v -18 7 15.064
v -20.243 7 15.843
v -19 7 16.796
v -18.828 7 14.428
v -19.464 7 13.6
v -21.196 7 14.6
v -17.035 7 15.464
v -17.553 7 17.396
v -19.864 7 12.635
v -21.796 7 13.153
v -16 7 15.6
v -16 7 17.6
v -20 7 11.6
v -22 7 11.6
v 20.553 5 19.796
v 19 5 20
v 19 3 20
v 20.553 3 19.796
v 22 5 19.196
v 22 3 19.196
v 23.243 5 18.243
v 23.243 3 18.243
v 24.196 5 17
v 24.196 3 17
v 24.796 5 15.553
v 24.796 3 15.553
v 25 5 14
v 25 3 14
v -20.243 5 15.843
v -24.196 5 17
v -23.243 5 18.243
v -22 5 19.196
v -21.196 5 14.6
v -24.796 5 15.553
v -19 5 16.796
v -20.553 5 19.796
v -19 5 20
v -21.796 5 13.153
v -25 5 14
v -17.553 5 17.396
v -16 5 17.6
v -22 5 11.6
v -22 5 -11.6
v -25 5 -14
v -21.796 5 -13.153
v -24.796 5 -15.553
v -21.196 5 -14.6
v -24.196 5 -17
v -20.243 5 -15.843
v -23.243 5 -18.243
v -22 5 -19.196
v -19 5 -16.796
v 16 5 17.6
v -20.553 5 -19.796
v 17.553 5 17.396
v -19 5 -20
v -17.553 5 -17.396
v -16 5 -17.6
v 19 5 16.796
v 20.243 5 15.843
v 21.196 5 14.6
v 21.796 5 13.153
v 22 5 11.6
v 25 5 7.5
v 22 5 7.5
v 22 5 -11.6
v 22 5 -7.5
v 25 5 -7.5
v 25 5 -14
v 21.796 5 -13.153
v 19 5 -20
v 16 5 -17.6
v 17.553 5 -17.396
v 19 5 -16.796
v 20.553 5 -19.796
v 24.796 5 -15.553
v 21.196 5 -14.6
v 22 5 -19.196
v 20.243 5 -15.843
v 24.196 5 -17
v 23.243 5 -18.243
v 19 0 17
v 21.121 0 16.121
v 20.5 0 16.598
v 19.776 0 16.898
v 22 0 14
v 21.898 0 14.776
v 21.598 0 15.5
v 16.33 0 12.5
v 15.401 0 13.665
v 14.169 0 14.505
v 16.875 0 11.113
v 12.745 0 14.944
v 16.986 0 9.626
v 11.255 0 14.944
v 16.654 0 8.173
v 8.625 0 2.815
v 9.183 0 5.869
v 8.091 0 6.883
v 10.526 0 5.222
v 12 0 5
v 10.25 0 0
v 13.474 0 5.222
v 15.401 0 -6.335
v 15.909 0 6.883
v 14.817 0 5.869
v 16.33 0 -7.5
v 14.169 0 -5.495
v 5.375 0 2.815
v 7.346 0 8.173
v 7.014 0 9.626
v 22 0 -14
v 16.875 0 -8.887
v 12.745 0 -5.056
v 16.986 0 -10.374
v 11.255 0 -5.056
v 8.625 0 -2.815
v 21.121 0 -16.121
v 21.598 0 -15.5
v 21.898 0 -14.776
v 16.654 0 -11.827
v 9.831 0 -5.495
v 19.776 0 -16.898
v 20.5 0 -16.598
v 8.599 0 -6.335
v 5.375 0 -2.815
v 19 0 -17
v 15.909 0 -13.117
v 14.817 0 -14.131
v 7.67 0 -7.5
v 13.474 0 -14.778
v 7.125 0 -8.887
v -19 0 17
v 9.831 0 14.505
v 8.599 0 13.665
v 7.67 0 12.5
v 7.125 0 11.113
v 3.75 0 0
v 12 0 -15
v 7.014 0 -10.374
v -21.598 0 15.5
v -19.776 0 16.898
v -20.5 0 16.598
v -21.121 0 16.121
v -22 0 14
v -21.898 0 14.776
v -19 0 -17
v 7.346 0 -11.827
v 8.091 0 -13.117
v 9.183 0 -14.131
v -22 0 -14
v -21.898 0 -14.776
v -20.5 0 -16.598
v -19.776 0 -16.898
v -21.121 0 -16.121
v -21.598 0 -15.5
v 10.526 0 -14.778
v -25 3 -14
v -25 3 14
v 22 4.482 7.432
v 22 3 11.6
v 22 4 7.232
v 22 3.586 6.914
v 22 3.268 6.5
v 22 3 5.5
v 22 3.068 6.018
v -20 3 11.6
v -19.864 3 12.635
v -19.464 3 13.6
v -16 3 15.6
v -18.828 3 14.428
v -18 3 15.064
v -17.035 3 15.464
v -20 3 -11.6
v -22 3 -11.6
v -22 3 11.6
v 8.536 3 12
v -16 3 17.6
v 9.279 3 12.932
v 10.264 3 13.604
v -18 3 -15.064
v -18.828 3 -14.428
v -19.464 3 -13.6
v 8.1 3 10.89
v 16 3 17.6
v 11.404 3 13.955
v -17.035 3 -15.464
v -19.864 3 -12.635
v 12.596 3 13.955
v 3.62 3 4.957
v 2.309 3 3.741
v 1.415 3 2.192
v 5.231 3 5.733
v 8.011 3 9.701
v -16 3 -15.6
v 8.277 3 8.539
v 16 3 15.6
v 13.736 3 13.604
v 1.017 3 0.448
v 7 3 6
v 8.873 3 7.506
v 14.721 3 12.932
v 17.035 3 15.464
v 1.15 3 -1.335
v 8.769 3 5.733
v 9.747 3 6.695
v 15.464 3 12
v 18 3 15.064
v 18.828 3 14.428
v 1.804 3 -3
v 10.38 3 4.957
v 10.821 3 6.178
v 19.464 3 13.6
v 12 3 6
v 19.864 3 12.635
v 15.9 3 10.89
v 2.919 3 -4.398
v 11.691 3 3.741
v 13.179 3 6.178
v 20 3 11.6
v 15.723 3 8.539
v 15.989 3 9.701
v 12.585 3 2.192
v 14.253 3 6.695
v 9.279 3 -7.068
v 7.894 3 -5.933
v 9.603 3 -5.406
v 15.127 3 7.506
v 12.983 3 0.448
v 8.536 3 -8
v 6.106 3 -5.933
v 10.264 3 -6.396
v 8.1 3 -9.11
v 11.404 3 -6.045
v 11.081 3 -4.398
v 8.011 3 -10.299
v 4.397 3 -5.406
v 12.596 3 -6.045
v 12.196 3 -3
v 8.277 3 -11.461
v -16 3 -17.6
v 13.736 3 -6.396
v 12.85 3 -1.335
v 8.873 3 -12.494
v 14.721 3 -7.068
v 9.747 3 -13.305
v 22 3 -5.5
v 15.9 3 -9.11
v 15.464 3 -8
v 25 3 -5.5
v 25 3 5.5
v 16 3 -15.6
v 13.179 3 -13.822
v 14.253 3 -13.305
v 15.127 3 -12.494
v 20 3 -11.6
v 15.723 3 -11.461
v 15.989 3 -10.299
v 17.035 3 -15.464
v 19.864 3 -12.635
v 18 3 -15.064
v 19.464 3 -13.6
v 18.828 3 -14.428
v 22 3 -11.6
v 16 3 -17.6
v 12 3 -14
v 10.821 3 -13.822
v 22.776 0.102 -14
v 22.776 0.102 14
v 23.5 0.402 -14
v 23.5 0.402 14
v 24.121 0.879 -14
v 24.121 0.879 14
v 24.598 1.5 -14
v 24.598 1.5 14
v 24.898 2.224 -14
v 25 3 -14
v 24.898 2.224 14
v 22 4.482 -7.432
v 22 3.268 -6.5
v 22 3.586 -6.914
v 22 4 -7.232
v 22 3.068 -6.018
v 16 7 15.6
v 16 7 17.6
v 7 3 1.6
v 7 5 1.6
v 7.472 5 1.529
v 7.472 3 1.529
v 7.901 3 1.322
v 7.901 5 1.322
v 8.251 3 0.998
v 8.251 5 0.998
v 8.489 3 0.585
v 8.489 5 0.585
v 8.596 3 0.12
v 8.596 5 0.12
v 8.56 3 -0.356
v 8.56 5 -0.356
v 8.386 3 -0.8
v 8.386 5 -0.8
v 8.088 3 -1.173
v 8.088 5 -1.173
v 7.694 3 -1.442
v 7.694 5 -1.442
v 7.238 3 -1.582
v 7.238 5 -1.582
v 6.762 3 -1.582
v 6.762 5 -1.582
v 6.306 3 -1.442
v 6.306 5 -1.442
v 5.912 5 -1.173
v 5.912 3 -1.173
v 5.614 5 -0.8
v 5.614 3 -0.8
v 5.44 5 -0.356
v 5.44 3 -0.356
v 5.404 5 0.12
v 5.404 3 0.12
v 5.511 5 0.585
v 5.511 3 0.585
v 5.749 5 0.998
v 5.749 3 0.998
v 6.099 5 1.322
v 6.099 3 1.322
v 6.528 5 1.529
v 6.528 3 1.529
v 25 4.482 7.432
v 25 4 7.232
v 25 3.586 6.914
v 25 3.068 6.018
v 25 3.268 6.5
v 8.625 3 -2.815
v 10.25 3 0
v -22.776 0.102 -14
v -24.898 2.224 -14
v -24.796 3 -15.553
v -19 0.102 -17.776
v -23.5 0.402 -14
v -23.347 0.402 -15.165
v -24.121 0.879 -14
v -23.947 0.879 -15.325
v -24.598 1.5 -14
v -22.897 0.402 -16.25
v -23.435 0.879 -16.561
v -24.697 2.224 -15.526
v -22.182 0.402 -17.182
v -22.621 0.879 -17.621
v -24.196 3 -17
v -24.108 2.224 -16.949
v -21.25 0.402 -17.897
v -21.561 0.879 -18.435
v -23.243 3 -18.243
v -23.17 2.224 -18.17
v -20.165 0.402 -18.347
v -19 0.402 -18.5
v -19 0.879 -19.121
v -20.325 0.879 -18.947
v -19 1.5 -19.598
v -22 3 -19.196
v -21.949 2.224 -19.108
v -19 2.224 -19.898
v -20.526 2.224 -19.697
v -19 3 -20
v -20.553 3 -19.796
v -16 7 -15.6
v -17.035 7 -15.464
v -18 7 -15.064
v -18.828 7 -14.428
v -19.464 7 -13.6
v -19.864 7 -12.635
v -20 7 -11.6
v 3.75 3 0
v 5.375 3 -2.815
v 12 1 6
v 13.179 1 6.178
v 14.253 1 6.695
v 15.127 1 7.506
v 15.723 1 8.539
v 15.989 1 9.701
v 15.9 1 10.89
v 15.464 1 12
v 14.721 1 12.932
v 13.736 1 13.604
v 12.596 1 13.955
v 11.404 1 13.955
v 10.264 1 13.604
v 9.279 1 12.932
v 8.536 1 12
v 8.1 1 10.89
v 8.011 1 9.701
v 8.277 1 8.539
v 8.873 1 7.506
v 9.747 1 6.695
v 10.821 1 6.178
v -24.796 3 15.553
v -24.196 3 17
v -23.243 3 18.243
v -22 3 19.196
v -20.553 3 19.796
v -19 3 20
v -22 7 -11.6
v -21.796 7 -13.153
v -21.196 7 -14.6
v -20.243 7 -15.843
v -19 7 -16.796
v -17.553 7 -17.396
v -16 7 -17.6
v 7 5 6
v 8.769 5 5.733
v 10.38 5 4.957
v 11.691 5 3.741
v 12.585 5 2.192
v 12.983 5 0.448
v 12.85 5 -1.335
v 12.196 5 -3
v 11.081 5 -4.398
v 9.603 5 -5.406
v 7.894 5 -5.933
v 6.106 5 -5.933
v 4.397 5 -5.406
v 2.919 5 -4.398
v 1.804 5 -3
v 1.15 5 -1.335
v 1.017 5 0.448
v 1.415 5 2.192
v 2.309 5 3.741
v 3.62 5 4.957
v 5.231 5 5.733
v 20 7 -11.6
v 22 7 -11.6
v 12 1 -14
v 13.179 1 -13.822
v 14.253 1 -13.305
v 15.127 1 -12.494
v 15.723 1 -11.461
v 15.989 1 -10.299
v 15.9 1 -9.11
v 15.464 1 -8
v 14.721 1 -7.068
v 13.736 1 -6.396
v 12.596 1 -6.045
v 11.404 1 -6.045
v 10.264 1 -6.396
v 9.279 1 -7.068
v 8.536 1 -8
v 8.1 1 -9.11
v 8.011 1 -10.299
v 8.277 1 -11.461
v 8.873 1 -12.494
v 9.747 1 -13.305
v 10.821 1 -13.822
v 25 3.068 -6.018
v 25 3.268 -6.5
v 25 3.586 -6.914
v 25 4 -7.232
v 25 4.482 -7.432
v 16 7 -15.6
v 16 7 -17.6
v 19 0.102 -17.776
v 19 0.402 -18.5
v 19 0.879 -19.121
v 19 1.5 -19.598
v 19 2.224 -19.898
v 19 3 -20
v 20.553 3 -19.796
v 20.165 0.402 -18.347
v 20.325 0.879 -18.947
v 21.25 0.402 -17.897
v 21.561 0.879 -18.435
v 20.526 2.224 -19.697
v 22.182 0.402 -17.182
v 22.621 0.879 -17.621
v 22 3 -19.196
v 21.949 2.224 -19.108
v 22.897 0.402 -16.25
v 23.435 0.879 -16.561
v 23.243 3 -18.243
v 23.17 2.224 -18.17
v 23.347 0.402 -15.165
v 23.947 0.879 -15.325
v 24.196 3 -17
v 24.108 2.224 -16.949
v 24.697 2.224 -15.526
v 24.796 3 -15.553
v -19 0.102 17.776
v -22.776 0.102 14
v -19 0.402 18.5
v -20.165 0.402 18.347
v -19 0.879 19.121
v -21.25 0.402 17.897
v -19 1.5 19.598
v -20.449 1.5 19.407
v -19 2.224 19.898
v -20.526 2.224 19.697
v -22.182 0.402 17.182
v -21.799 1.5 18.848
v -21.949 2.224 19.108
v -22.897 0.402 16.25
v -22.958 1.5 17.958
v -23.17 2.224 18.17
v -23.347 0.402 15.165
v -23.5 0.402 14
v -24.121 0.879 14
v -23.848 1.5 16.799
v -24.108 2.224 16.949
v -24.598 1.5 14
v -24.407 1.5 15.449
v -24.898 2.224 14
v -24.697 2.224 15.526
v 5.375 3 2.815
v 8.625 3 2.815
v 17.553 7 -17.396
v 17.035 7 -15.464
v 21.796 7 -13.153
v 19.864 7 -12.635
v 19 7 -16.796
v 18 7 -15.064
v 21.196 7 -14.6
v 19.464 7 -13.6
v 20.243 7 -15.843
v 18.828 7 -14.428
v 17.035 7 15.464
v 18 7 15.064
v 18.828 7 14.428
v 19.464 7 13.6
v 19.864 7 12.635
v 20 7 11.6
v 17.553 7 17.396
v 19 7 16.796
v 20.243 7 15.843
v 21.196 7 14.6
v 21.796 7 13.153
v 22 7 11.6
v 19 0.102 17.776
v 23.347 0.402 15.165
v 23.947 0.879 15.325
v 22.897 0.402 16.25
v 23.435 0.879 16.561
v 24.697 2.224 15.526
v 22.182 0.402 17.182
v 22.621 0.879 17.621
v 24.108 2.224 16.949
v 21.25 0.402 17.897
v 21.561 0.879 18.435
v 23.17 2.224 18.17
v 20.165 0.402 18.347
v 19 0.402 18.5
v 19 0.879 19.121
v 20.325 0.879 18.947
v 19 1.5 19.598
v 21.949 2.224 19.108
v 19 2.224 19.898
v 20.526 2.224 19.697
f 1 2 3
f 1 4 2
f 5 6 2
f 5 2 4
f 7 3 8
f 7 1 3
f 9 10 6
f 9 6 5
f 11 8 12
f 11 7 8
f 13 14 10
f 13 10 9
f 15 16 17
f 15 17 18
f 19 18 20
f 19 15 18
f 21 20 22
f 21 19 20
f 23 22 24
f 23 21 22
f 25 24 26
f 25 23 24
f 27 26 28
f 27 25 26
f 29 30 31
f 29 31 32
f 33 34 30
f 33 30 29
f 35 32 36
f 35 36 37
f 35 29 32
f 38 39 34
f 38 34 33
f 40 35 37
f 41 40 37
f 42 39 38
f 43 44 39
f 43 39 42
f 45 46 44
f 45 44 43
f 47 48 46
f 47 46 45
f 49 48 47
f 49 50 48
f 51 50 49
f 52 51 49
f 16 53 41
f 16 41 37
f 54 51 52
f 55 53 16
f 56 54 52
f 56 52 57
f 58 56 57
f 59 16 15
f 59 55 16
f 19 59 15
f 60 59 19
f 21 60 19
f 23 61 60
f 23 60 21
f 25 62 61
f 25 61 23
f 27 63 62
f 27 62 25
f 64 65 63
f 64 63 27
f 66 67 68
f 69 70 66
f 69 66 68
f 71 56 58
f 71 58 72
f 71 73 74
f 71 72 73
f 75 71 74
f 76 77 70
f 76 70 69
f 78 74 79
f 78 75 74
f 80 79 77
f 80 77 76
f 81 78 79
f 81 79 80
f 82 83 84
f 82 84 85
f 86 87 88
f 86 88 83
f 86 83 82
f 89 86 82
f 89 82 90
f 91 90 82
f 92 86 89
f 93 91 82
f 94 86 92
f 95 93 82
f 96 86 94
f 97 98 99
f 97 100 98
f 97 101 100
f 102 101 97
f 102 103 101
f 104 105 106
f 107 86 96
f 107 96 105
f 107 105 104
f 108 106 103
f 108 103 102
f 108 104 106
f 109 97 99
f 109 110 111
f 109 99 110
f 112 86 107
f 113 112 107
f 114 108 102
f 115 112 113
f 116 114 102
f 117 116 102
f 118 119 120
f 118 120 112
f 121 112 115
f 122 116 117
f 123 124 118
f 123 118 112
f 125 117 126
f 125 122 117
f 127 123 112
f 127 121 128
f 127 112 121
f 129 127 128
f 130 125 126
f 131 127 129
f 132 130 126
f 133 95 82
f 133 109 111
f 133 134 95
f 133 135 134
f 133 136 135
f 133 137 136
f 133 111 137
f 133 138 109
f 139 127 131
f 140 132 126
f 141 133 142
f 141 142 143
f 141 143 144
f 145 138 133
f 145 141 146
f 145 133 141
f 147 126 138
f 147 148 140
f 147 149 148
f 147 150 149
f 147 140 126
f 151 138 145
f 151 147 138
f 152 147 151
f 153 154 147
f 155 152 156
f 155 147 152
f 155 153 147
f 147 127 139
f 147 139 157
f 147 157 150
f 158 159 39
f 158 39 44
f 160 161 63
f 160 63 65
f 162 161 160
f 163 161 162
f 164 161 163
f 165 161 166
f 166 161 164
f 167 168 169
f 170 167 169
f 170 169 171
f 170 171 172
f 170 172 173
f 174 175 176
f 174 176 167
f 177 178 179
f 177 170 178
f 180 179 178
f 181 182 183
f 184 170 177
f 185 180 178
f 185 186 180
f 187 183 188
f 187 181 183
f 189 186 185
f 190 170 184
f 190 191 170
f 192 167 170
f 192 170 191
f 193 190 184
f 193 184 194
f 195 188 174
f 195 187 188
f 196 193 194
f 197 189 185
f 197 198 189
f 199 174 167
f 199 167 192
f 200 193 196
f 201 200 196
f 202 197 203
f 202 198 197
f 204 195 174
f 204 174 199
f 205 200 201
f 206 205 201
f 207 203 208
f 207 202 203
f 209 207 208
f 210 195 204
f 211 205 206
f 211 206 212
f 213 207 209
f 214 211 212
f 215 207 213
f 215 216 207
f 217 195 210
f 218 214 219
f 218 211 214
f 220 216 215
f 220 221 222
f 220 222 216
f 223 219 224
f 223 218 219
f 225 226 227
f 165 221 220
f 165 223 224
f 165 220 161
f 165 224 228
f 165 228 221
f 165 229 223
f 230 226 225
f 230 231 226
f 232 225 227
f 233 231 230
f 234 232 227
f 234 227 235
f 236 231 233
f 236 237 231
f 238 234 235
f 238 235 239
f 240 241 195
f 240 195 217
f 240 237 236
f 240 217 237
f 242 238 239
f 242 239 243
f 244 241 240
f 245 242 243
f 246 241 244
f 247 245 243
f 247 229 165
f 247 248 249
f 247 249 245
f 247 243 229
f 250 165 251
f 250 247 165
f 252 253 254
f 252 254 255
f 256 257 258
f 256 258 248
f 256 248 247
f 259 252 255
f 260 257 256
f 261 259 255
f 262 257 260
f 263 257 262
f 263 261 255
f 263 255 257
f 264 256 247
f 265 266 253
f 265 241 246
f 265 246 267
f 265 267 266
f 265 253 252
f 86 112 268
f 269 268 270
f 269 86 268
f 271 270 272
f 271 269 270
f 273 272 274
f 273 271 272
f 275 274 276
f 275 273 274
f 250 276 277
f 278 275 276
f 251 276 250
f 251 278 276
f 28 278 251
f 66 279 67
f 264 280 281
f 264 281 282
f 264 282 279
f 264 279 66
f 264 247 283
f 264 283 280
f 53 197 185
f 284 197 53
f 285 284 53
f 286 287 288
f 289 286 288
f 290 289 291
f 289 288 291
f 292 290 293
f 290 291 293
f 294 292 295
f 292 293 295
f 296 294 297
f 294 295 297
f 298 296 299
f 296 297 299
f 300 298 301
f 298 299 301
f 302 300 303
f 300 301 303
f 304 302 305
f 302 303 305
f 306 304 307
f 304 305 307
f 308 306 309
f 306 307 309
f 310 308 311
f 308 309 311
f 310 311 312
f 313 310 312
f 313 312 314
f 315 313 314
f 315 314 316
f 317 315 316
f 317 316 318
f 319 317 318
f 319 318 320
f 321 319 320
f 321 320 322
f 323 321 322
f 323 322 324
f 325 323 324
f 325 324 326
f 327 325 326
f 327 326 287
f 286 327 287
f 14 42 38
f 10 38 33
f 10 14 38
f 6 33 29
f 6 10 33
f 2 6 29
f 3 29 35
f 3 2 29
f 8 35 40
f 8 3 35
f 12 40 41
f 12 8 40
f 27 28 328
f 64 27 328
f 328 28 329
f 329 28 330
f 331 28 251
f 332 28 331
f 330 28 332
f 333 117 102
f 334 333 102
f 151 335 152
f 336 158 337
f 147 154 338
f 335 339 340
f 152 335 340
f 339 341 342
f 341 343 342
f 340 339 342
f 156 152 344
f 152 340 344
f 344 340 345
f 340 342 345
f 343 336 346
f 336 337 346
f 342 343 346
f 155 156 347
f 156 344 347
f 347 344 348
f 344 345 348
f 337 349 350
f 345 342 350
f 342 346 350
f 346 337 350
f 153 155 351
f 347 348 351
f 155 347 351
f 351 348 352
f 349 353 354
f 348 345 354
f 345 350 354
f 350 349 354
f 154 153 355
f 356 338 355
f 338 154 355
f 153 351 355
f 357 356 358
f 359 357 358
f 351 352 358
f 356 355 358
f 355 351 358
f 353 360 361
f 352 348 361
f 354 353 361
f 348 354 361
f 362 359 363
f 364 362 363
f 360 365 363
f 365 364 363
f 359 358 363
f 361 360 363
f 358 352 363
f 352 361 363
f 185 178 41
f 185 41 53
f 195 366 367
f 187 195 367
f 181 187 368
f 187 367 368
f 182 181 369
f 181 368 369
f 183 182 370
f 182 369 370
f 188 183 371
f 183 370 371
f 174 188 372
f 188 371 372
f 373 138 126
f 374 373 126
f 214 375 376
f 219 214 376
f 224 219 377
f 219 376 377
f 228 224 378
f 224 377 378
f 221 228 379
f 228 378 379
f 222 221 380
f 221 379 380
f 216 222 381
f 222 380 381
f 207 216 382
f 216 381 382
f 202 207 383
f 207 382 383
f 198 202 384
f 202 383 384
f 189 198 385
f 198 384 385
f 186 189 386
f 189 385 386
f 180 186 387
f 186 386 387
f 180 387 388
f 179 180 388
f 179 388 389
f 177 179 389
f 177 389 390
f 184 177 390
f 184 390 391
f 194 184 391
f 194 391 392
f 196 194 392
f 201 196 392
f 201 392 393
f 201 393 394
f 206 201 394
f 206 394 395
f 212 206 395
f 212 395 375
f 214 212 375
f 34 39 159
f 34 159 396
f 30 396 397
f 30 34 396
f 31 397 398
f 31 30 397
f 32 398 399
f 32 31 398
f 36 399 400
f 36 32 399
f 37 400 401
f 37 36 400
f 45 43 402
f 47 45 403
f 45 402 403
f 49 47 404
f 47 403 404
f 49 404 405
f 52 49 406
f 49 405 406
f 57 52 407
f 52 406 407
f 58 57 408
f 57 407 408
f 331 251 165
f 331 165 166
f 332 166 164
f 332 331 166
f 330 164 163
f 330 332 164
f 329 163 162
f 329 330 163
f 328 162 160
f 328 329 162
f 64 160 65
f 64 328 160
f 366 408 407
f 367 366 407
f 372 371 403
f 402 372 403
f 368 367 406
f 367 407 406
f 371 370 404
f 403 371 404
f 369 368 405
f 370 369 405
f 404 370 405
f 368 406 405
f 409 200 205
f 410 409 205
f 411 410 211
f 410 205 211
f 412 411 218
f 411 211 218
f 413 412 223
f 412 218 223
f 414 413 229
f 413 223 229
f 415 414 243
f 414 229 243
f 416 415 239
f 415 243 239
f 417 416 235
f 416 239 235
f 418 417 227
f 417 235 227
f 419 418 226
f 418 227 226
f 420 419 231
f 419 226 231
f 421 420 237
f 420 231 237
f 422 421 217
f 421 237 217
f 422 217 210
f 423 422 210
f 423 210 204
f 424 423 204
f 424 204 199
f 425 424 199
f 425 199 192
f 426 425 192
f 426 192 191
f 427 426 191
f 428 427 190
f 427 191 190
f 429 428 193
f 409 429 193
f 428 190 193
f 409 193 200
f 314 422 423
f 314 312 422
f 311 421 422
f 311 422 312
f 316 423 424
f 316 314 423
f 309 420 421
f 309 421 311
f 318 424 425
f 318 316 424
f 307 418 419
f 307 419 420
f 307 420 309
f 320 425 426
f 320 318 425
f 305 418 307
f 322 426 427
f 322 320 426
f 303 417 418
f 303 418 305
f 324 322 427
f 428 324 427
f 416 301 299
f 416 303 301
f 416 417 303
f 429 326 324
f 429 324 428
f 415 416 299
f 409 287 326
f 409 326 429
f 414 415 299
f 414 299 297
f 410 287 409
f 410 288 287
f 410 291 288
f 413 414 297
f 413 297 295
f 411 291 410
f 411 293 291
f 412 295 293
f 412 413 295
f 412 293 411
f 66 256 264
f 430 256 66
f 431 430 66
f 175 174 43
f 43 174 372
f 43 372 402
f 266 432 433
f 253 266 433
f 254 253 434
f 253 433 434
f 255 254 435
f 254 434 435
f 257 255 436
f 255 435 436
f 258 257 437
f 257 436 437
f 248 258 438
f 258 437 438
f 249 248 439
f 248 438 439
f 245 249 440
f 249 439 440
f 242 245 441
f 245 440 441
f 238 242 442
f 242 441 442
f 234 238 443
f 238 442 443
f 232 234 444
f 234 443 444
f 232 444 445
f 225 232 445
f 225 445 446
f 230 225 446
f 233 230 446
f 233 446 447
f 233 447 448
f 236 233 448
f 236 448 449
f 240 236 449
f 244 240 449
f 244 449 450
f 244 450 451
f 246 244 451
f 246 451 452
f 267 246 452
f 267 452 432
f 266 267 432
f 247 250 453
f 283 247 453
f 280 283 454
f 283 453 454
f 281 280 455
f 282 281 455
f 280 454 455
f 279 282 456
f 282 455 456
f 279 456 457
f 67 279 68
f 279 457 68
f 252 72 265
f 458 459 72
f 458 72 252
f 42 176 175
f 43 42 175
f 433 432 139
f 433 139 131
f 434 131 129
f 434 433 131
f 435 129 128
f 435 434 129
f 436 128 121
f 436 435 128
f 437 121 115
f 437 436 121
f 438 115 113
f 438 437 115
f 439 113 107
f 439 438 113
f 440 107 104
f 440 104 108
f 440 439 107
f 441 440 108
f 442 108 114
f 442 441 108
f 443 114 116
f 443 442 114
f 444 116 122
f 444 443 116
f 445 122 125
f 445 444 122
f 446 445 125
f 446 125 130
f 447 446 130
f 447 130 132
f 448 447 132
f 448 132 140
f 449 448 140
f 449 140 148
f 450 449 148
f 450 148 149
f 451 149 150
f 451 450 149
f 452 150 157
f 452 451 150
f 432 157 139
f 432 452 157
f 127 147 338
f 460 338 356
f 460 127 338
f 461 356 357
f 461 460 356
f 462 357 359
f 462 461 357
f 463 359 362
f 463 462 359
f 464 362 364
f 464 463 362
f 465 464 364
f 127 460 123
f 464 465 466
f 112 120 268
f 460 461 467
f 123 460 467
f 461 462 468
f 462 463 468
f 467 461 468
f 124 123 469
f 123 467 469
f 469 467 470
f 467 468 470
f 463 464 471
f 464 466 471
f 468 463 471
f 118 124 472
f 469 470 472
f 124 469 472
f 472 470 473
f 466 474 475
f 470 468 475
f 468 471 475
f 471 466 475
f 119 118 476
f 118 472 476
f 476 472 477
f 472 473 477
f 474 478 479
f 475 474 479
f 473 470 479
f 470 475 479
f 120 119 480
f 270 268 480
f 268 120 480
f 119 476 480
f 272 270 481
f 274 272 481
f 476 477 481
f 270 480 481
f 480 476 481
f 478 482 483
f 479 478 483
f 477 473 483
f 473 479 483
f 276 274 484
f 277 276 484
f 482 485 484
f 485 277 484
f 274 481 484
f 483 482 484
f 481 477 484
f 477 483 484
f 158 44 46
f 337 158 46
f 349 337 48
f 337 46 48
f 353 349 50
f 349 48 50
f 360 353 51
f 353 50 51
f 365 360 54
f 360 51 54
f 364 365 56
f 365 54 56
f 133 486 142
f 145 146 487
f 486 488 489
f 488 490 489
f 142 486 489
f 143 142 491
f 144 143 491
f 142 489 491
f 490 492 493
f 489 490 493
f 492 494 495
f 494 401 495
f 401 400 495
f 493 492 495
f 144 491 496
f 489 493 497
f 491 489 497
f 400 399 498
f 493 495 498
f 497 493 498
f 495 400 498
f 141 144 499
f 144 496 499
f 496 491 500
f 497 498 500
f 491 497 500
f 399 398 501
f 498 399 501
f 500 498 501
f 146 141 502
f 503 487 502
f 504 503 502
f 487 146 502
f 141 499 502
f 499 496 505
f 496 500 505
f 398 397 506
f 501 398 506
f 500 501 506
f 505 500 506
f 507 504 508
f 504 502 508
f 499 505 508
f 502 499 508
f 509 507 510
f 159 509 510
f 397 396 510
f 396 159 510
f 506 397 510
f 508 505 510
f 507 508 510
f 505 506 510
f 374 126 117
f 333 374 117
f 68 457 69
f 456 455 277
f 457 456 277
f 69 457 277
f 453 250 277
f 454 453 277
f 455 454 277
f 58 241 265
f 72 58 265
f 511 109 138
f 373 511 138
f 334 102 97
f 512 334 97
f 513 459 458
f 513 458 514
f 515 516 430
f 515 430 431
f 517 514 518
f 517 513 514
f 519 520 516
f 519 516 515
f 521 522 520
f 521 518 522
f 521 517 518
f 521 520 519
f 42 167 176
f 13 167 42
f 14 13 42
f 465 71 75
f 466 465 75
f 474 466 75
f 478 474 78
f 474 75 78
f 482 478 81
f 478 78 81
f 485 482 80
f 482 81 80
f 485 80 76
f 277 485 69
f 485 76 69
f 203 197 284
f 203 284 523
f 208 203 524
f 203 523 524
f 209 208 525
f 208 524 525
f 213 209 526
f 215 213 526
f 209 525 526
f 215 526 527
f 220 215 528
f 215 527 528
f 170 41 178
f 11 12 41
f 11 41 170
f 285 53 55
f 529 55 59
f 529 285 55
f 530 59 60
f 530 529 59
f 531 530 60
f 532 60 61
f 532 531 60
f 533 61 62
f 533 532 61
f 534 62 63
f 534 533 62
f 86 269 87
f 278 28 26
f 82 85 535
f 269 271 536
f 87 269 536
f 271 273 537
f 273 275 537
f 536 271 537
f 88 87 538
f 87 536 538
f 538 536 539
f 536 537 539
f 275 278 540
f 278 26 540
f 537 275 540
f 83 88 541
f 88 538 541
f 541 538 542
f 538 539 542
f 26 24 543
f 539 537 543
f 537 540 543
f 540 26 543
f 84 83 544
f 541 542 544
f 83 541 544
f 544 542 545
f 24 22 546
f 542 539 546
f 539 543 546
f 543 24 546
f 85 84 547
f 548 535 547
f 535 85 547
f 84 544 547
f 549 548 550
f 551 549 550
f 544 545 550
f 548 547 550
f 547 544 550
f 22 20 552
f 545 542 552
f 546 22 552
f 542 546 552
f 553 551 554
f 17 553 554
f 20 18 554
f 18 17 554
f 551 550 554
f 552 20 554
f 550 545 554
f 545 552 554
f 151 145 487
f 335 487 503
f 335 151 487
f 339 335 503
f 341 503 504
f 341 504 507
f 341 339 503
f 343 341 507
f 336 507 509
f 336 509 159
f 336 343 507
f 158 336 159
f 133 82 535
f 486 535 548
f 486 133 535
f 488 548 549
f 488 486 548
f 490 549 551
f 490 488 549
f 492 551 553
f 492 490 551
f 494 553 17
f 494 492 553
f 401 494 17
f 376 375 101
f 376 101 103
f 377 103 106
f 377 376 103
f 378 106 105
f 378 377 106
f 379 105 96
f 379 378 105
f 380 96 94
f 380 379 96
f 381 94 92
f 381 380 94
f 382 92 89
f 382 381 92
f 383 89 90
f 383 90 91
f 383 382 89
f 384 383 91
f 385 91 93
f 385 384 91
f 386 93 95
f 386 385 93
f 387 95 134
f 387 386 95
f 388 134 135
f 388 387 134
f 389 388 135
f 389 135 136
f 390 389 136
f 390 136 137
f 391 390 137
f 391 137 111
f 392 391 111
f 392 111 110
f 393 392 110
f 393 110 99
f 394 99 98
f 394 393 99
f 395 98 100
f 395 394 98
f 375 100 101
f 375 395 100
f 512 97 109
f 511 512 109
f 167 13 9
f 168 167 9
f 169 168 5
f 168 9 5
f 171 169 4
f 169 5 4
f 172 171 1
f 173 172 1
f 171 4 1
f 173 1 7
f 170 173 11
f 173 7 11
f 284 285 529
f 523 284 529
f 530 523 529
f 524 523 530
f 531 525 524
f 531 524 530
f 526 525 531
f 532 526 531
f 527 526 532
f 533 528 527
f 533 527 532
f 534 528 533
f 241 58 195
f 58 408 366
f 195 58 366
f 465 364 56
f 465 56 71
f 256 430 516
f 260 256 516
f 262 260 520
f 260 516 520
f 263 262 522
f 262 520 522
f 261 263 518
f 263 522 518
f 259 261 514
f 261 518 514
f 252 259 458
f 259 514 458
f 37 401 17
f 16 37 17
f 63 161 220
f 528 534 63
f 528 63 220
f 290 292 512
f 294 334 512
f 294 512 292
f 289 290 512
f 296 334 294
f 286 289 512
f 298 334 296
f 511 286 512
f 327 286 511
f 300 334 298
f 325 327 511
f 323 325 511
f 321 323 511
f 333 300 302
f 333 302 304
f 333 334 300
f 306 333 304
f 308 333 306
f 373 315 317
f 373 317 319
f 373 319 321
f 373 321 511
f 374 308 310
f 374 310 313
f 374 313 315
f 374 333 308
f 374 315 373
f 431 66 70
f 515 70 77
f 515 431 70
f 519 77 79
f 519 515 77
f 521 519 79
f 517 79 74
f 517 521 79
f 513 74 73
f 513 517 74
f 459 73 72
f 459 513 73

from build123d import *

# Parameters (mm, degrees)
SKETCH1_W           = 50
SKETCH1_H           = 40
SKETCH1_W_2         = 44
SKETCH1_H_2         = 35.2
BOSS_EXTRUDE1_DEPTH = 5
SKETCH2_W           = 44
SKETCH2_H           = 35.2
BOSS_EXTRUDE2_DEPTH = 3
SKETCH3_R           = 6
BOSS_EXTRUDE3_DEPTH = 2
SKETCH4_R           = 1.6
CUT_EXTRUDE1_DEPTH  = 5
FILLET1_R           = 6
FILLET2_R           = 3
CUT_EXTRUDE2_DEPTH  = 3
SKETCH8_R           = 4
CUT_EXTRUDE3_DEPTH  = 3
CHAMFER1_SIZE       = 1
SKETCH9_W           = 3
SKETCH9_H           = 15
CUT_EXTRUDE4_DEPTH  = 2
FILLET3_R           = 2
BOSS_EXTRUDE5_START = 4
BOSS_EXTRUDE5_DEPTH = 4
SKETCH11_R          = 4
CUT_EXTRUDE5_DEPTH  = 4


with BuildPart() as part:
    # Sketch1 → Boss-Extrude1 (new body)
    with BuildSketch(Plane(origin=(0, 0, 0), x_dir=(1, 0, 0), z_dir=(0, 1, 0))):
        Rectangle(SKETCH1_W, SKETCH1_H)
        Rectangle(SKETCH1_W_2, SKETCH1_H_2, mode=Mode.SUBTRACT)
    extrude(amount=BOSS_EXTRUDE1_DEPTH)

    # Sketch2 → Boss-Extrude2 (add)
    with BuildSketch(Plane(origin=(0, 0, 0), x_dir=(-1, 0, 0), z_dir=(0, -1, 0))):
        Rectangle(SKETCH2_W, SKETCH2_H)
    extrude(amount=-BOSS_EXTRUDE2_DEPTH)

    # Sketch3 → Boss-Extrude3 (add)
    with BuildSketch(Plane(origin=(0, 3, 0), x_dir=(1, 0, 0), z_dir=(0, 1, 0))):
        with Locations(Location((7, 0, 0), (0, 0, 270))):
            Circle(SKETCH3_R)
    extrude(amount=BOSS_EXTRUDE3_DEPTH)

    # Sketch4 → Cut-Extrude1 (cut)
    with BuildSketch(Plane(origin=(0, 5, 0), x_dir=(1, 0, 0), z_dir=(0, 1, 0))):
        with Locations(Location((7, 0, 0), (0, 0, 270))):
            Circle(SKETCH4_R)
    extrude(amount=-CUT_EXTRUDE1_DEPTH, mode=Mode.SUBTRACT)

    # Fillet1
    fillet1_edges = [part.edges().sort_by_distance(p)[0] for p in [
        (22, 4, 17.6),
        (22, 4, -17.6),
        (-22, 4, -17.6),
        (-22, 4, 17.6),
        (-25, 2.5, -20),
        (25, 2.5, -20),
        (25, 2.5, 20),
        (-25, 2.5, 20),
    ]]
    fillet(fillet1_edges, radius=FILLET1_R)

    # Fillet2
    fillet2_edges = [part.edges().sort_by_distance(p)[0] for p in [
        (-25, 0, 0),
        (0, 0, -20),
        (25, 0, 0),
        (0, 0, 20),
        (23.242640687, 0, -18.242640687),
        (23.242640687, 0, 18.242640687),
        (-23.242640687, 0, 18.242640687),
        (-23.242640687, 0, -18.242640687),
    ]]
    fillet(fillet2_edges, radius=FILLET2_R)

    # Sketch6 → Cut-Extrude2 (cut)
    with BuildSketch(Plane(origin=(0, 0, 0), x_dir=(-1, 0, 0), z_dir=(0, -1, 0))):
        Polygon((-3.75, 0), (-5.375, 2.814582562), (-8.625, 2.814582562), (-10.25, 0), (-8.625, -2.814582562), (-5.375, -2.814582562), align=None)
    extrude(amount=-CUT_EXTRUDE2_DEPTH, mode=Mode.SUBTRACT)

    # Sketch8 → Cut-Extrude3 (cut)
    with BuildSketch(Plane(origin=(0, 0, 0), x_dir=(-1, 0, 0), z_dir=(0, -1, 0))):
        with Locations(Location((-12, -10, 0), (0, 0, 90))):
            Circle(SKETCH8_R)
        with Locations(Location((-12, 10, 0), (0, 0, 90))):
            Circle(SKETCH8_R)
    extrude(amount=-CUT_EXTRUDE3_DEPTH, mode=Mode.SUBTRACT)

    # Chamfer1
    chamfer1_edges = [part.edges().sort_by_distance(p)[0] for p in [
        (12, 0, 14),
        (12, 0, -6),
    ]]
    chamfer(chamfer1_edges, length=CHAMFER1_SIZE)

    # Sketch9 → Cut-Extrude4 (cut)
    with BuildSketch(Plane(origin=(0, 5, 0), x_dir=(1, 0, 0), z_dir=(0, 1, 0))):
        with Locations((23.5, 0)):
            Rectangle(SKETCH9_W, SKETCH9_H)
    extrude(amount=-CUT_EXTRUDE4_DEPTH, mode=Mode.SUBTRACT)

    # Fillet3
    fillet3_edges = [part.edges().sort_by_distance(p)[0] for p in [
        (23.5, 3, -7.5),
        (23.5, 3, 7.5),
    ]]
    fillet(fillet3_edges, radius=FILLET3_R - 0.0001)  # a hair under: the kernel refuses the full size

    # Sketch10 → Boss-Extrude5 (add)
    with BuildSketch(Plane(origin=(0, 3, 0), x_dir=(1, 0, 0), z_dir=(0, 1, 0)).offset(BOSS_EXTRUDE5_START)):
        with BuildLine():
            Line((-16, -17.6), (-16, -11.6))
            Line((-16, -11.6), (-22, -11.6))
            ThreePointArc((-22, -11.6), (-20.242640687, -15.842640687), (-16, -17.6))
        make_face()
        with BuildLine():
            Line((-16, 17.6), (-16, 11.6))
            Line((-16, 11.6), (-22, 11.6))
            ThreePointArc((-22, 11.6), (-20.242640687, 15.842640687), (-16, 17.6))
        make_face()
        with BuildLine():
            Line((16, 17.6), (16, 11.6))
            Line((16, 11.6), (22, 11.6))
            ThreePointArc((22, 11.6), (20.242640687, 15.842640687), (16, 17.6))
        make_face()
        with BuildLine():
            Line((22, -11.6), (16, -11.6))
            Line((16, -11.6), (16, -17.6))
            ThreePointArc((16, -17.6), (20.242640687, -15.842640687), (22, -11.6))
        make_face()
    extrude(amount=-BOSS_EXTRUDE5_DEPTH)

    # Sketch11 → Cut-Extrude5 (cut)
    with BuildSketch(Plane(origin=(0, 7, 0), x_dir=(1, 0, 0), z_dir=(0, 1, 0))):
        with Locations((16, 11.6)):
            Circle(SKETCH11_R)
        with Locations((16, -11.6)):
            Circle(SKETCH11_R)
        with Locations((-16, -11.6)):
            Circle(SKETCH11_R)
        with Locations((-16, 11.6)):
            Circle(SKETCH11_R)
    extrude(amount=-CUT_EXTRUDE5_DEPTH, mode=Mode.SUBTRACT)


solid = part.part
